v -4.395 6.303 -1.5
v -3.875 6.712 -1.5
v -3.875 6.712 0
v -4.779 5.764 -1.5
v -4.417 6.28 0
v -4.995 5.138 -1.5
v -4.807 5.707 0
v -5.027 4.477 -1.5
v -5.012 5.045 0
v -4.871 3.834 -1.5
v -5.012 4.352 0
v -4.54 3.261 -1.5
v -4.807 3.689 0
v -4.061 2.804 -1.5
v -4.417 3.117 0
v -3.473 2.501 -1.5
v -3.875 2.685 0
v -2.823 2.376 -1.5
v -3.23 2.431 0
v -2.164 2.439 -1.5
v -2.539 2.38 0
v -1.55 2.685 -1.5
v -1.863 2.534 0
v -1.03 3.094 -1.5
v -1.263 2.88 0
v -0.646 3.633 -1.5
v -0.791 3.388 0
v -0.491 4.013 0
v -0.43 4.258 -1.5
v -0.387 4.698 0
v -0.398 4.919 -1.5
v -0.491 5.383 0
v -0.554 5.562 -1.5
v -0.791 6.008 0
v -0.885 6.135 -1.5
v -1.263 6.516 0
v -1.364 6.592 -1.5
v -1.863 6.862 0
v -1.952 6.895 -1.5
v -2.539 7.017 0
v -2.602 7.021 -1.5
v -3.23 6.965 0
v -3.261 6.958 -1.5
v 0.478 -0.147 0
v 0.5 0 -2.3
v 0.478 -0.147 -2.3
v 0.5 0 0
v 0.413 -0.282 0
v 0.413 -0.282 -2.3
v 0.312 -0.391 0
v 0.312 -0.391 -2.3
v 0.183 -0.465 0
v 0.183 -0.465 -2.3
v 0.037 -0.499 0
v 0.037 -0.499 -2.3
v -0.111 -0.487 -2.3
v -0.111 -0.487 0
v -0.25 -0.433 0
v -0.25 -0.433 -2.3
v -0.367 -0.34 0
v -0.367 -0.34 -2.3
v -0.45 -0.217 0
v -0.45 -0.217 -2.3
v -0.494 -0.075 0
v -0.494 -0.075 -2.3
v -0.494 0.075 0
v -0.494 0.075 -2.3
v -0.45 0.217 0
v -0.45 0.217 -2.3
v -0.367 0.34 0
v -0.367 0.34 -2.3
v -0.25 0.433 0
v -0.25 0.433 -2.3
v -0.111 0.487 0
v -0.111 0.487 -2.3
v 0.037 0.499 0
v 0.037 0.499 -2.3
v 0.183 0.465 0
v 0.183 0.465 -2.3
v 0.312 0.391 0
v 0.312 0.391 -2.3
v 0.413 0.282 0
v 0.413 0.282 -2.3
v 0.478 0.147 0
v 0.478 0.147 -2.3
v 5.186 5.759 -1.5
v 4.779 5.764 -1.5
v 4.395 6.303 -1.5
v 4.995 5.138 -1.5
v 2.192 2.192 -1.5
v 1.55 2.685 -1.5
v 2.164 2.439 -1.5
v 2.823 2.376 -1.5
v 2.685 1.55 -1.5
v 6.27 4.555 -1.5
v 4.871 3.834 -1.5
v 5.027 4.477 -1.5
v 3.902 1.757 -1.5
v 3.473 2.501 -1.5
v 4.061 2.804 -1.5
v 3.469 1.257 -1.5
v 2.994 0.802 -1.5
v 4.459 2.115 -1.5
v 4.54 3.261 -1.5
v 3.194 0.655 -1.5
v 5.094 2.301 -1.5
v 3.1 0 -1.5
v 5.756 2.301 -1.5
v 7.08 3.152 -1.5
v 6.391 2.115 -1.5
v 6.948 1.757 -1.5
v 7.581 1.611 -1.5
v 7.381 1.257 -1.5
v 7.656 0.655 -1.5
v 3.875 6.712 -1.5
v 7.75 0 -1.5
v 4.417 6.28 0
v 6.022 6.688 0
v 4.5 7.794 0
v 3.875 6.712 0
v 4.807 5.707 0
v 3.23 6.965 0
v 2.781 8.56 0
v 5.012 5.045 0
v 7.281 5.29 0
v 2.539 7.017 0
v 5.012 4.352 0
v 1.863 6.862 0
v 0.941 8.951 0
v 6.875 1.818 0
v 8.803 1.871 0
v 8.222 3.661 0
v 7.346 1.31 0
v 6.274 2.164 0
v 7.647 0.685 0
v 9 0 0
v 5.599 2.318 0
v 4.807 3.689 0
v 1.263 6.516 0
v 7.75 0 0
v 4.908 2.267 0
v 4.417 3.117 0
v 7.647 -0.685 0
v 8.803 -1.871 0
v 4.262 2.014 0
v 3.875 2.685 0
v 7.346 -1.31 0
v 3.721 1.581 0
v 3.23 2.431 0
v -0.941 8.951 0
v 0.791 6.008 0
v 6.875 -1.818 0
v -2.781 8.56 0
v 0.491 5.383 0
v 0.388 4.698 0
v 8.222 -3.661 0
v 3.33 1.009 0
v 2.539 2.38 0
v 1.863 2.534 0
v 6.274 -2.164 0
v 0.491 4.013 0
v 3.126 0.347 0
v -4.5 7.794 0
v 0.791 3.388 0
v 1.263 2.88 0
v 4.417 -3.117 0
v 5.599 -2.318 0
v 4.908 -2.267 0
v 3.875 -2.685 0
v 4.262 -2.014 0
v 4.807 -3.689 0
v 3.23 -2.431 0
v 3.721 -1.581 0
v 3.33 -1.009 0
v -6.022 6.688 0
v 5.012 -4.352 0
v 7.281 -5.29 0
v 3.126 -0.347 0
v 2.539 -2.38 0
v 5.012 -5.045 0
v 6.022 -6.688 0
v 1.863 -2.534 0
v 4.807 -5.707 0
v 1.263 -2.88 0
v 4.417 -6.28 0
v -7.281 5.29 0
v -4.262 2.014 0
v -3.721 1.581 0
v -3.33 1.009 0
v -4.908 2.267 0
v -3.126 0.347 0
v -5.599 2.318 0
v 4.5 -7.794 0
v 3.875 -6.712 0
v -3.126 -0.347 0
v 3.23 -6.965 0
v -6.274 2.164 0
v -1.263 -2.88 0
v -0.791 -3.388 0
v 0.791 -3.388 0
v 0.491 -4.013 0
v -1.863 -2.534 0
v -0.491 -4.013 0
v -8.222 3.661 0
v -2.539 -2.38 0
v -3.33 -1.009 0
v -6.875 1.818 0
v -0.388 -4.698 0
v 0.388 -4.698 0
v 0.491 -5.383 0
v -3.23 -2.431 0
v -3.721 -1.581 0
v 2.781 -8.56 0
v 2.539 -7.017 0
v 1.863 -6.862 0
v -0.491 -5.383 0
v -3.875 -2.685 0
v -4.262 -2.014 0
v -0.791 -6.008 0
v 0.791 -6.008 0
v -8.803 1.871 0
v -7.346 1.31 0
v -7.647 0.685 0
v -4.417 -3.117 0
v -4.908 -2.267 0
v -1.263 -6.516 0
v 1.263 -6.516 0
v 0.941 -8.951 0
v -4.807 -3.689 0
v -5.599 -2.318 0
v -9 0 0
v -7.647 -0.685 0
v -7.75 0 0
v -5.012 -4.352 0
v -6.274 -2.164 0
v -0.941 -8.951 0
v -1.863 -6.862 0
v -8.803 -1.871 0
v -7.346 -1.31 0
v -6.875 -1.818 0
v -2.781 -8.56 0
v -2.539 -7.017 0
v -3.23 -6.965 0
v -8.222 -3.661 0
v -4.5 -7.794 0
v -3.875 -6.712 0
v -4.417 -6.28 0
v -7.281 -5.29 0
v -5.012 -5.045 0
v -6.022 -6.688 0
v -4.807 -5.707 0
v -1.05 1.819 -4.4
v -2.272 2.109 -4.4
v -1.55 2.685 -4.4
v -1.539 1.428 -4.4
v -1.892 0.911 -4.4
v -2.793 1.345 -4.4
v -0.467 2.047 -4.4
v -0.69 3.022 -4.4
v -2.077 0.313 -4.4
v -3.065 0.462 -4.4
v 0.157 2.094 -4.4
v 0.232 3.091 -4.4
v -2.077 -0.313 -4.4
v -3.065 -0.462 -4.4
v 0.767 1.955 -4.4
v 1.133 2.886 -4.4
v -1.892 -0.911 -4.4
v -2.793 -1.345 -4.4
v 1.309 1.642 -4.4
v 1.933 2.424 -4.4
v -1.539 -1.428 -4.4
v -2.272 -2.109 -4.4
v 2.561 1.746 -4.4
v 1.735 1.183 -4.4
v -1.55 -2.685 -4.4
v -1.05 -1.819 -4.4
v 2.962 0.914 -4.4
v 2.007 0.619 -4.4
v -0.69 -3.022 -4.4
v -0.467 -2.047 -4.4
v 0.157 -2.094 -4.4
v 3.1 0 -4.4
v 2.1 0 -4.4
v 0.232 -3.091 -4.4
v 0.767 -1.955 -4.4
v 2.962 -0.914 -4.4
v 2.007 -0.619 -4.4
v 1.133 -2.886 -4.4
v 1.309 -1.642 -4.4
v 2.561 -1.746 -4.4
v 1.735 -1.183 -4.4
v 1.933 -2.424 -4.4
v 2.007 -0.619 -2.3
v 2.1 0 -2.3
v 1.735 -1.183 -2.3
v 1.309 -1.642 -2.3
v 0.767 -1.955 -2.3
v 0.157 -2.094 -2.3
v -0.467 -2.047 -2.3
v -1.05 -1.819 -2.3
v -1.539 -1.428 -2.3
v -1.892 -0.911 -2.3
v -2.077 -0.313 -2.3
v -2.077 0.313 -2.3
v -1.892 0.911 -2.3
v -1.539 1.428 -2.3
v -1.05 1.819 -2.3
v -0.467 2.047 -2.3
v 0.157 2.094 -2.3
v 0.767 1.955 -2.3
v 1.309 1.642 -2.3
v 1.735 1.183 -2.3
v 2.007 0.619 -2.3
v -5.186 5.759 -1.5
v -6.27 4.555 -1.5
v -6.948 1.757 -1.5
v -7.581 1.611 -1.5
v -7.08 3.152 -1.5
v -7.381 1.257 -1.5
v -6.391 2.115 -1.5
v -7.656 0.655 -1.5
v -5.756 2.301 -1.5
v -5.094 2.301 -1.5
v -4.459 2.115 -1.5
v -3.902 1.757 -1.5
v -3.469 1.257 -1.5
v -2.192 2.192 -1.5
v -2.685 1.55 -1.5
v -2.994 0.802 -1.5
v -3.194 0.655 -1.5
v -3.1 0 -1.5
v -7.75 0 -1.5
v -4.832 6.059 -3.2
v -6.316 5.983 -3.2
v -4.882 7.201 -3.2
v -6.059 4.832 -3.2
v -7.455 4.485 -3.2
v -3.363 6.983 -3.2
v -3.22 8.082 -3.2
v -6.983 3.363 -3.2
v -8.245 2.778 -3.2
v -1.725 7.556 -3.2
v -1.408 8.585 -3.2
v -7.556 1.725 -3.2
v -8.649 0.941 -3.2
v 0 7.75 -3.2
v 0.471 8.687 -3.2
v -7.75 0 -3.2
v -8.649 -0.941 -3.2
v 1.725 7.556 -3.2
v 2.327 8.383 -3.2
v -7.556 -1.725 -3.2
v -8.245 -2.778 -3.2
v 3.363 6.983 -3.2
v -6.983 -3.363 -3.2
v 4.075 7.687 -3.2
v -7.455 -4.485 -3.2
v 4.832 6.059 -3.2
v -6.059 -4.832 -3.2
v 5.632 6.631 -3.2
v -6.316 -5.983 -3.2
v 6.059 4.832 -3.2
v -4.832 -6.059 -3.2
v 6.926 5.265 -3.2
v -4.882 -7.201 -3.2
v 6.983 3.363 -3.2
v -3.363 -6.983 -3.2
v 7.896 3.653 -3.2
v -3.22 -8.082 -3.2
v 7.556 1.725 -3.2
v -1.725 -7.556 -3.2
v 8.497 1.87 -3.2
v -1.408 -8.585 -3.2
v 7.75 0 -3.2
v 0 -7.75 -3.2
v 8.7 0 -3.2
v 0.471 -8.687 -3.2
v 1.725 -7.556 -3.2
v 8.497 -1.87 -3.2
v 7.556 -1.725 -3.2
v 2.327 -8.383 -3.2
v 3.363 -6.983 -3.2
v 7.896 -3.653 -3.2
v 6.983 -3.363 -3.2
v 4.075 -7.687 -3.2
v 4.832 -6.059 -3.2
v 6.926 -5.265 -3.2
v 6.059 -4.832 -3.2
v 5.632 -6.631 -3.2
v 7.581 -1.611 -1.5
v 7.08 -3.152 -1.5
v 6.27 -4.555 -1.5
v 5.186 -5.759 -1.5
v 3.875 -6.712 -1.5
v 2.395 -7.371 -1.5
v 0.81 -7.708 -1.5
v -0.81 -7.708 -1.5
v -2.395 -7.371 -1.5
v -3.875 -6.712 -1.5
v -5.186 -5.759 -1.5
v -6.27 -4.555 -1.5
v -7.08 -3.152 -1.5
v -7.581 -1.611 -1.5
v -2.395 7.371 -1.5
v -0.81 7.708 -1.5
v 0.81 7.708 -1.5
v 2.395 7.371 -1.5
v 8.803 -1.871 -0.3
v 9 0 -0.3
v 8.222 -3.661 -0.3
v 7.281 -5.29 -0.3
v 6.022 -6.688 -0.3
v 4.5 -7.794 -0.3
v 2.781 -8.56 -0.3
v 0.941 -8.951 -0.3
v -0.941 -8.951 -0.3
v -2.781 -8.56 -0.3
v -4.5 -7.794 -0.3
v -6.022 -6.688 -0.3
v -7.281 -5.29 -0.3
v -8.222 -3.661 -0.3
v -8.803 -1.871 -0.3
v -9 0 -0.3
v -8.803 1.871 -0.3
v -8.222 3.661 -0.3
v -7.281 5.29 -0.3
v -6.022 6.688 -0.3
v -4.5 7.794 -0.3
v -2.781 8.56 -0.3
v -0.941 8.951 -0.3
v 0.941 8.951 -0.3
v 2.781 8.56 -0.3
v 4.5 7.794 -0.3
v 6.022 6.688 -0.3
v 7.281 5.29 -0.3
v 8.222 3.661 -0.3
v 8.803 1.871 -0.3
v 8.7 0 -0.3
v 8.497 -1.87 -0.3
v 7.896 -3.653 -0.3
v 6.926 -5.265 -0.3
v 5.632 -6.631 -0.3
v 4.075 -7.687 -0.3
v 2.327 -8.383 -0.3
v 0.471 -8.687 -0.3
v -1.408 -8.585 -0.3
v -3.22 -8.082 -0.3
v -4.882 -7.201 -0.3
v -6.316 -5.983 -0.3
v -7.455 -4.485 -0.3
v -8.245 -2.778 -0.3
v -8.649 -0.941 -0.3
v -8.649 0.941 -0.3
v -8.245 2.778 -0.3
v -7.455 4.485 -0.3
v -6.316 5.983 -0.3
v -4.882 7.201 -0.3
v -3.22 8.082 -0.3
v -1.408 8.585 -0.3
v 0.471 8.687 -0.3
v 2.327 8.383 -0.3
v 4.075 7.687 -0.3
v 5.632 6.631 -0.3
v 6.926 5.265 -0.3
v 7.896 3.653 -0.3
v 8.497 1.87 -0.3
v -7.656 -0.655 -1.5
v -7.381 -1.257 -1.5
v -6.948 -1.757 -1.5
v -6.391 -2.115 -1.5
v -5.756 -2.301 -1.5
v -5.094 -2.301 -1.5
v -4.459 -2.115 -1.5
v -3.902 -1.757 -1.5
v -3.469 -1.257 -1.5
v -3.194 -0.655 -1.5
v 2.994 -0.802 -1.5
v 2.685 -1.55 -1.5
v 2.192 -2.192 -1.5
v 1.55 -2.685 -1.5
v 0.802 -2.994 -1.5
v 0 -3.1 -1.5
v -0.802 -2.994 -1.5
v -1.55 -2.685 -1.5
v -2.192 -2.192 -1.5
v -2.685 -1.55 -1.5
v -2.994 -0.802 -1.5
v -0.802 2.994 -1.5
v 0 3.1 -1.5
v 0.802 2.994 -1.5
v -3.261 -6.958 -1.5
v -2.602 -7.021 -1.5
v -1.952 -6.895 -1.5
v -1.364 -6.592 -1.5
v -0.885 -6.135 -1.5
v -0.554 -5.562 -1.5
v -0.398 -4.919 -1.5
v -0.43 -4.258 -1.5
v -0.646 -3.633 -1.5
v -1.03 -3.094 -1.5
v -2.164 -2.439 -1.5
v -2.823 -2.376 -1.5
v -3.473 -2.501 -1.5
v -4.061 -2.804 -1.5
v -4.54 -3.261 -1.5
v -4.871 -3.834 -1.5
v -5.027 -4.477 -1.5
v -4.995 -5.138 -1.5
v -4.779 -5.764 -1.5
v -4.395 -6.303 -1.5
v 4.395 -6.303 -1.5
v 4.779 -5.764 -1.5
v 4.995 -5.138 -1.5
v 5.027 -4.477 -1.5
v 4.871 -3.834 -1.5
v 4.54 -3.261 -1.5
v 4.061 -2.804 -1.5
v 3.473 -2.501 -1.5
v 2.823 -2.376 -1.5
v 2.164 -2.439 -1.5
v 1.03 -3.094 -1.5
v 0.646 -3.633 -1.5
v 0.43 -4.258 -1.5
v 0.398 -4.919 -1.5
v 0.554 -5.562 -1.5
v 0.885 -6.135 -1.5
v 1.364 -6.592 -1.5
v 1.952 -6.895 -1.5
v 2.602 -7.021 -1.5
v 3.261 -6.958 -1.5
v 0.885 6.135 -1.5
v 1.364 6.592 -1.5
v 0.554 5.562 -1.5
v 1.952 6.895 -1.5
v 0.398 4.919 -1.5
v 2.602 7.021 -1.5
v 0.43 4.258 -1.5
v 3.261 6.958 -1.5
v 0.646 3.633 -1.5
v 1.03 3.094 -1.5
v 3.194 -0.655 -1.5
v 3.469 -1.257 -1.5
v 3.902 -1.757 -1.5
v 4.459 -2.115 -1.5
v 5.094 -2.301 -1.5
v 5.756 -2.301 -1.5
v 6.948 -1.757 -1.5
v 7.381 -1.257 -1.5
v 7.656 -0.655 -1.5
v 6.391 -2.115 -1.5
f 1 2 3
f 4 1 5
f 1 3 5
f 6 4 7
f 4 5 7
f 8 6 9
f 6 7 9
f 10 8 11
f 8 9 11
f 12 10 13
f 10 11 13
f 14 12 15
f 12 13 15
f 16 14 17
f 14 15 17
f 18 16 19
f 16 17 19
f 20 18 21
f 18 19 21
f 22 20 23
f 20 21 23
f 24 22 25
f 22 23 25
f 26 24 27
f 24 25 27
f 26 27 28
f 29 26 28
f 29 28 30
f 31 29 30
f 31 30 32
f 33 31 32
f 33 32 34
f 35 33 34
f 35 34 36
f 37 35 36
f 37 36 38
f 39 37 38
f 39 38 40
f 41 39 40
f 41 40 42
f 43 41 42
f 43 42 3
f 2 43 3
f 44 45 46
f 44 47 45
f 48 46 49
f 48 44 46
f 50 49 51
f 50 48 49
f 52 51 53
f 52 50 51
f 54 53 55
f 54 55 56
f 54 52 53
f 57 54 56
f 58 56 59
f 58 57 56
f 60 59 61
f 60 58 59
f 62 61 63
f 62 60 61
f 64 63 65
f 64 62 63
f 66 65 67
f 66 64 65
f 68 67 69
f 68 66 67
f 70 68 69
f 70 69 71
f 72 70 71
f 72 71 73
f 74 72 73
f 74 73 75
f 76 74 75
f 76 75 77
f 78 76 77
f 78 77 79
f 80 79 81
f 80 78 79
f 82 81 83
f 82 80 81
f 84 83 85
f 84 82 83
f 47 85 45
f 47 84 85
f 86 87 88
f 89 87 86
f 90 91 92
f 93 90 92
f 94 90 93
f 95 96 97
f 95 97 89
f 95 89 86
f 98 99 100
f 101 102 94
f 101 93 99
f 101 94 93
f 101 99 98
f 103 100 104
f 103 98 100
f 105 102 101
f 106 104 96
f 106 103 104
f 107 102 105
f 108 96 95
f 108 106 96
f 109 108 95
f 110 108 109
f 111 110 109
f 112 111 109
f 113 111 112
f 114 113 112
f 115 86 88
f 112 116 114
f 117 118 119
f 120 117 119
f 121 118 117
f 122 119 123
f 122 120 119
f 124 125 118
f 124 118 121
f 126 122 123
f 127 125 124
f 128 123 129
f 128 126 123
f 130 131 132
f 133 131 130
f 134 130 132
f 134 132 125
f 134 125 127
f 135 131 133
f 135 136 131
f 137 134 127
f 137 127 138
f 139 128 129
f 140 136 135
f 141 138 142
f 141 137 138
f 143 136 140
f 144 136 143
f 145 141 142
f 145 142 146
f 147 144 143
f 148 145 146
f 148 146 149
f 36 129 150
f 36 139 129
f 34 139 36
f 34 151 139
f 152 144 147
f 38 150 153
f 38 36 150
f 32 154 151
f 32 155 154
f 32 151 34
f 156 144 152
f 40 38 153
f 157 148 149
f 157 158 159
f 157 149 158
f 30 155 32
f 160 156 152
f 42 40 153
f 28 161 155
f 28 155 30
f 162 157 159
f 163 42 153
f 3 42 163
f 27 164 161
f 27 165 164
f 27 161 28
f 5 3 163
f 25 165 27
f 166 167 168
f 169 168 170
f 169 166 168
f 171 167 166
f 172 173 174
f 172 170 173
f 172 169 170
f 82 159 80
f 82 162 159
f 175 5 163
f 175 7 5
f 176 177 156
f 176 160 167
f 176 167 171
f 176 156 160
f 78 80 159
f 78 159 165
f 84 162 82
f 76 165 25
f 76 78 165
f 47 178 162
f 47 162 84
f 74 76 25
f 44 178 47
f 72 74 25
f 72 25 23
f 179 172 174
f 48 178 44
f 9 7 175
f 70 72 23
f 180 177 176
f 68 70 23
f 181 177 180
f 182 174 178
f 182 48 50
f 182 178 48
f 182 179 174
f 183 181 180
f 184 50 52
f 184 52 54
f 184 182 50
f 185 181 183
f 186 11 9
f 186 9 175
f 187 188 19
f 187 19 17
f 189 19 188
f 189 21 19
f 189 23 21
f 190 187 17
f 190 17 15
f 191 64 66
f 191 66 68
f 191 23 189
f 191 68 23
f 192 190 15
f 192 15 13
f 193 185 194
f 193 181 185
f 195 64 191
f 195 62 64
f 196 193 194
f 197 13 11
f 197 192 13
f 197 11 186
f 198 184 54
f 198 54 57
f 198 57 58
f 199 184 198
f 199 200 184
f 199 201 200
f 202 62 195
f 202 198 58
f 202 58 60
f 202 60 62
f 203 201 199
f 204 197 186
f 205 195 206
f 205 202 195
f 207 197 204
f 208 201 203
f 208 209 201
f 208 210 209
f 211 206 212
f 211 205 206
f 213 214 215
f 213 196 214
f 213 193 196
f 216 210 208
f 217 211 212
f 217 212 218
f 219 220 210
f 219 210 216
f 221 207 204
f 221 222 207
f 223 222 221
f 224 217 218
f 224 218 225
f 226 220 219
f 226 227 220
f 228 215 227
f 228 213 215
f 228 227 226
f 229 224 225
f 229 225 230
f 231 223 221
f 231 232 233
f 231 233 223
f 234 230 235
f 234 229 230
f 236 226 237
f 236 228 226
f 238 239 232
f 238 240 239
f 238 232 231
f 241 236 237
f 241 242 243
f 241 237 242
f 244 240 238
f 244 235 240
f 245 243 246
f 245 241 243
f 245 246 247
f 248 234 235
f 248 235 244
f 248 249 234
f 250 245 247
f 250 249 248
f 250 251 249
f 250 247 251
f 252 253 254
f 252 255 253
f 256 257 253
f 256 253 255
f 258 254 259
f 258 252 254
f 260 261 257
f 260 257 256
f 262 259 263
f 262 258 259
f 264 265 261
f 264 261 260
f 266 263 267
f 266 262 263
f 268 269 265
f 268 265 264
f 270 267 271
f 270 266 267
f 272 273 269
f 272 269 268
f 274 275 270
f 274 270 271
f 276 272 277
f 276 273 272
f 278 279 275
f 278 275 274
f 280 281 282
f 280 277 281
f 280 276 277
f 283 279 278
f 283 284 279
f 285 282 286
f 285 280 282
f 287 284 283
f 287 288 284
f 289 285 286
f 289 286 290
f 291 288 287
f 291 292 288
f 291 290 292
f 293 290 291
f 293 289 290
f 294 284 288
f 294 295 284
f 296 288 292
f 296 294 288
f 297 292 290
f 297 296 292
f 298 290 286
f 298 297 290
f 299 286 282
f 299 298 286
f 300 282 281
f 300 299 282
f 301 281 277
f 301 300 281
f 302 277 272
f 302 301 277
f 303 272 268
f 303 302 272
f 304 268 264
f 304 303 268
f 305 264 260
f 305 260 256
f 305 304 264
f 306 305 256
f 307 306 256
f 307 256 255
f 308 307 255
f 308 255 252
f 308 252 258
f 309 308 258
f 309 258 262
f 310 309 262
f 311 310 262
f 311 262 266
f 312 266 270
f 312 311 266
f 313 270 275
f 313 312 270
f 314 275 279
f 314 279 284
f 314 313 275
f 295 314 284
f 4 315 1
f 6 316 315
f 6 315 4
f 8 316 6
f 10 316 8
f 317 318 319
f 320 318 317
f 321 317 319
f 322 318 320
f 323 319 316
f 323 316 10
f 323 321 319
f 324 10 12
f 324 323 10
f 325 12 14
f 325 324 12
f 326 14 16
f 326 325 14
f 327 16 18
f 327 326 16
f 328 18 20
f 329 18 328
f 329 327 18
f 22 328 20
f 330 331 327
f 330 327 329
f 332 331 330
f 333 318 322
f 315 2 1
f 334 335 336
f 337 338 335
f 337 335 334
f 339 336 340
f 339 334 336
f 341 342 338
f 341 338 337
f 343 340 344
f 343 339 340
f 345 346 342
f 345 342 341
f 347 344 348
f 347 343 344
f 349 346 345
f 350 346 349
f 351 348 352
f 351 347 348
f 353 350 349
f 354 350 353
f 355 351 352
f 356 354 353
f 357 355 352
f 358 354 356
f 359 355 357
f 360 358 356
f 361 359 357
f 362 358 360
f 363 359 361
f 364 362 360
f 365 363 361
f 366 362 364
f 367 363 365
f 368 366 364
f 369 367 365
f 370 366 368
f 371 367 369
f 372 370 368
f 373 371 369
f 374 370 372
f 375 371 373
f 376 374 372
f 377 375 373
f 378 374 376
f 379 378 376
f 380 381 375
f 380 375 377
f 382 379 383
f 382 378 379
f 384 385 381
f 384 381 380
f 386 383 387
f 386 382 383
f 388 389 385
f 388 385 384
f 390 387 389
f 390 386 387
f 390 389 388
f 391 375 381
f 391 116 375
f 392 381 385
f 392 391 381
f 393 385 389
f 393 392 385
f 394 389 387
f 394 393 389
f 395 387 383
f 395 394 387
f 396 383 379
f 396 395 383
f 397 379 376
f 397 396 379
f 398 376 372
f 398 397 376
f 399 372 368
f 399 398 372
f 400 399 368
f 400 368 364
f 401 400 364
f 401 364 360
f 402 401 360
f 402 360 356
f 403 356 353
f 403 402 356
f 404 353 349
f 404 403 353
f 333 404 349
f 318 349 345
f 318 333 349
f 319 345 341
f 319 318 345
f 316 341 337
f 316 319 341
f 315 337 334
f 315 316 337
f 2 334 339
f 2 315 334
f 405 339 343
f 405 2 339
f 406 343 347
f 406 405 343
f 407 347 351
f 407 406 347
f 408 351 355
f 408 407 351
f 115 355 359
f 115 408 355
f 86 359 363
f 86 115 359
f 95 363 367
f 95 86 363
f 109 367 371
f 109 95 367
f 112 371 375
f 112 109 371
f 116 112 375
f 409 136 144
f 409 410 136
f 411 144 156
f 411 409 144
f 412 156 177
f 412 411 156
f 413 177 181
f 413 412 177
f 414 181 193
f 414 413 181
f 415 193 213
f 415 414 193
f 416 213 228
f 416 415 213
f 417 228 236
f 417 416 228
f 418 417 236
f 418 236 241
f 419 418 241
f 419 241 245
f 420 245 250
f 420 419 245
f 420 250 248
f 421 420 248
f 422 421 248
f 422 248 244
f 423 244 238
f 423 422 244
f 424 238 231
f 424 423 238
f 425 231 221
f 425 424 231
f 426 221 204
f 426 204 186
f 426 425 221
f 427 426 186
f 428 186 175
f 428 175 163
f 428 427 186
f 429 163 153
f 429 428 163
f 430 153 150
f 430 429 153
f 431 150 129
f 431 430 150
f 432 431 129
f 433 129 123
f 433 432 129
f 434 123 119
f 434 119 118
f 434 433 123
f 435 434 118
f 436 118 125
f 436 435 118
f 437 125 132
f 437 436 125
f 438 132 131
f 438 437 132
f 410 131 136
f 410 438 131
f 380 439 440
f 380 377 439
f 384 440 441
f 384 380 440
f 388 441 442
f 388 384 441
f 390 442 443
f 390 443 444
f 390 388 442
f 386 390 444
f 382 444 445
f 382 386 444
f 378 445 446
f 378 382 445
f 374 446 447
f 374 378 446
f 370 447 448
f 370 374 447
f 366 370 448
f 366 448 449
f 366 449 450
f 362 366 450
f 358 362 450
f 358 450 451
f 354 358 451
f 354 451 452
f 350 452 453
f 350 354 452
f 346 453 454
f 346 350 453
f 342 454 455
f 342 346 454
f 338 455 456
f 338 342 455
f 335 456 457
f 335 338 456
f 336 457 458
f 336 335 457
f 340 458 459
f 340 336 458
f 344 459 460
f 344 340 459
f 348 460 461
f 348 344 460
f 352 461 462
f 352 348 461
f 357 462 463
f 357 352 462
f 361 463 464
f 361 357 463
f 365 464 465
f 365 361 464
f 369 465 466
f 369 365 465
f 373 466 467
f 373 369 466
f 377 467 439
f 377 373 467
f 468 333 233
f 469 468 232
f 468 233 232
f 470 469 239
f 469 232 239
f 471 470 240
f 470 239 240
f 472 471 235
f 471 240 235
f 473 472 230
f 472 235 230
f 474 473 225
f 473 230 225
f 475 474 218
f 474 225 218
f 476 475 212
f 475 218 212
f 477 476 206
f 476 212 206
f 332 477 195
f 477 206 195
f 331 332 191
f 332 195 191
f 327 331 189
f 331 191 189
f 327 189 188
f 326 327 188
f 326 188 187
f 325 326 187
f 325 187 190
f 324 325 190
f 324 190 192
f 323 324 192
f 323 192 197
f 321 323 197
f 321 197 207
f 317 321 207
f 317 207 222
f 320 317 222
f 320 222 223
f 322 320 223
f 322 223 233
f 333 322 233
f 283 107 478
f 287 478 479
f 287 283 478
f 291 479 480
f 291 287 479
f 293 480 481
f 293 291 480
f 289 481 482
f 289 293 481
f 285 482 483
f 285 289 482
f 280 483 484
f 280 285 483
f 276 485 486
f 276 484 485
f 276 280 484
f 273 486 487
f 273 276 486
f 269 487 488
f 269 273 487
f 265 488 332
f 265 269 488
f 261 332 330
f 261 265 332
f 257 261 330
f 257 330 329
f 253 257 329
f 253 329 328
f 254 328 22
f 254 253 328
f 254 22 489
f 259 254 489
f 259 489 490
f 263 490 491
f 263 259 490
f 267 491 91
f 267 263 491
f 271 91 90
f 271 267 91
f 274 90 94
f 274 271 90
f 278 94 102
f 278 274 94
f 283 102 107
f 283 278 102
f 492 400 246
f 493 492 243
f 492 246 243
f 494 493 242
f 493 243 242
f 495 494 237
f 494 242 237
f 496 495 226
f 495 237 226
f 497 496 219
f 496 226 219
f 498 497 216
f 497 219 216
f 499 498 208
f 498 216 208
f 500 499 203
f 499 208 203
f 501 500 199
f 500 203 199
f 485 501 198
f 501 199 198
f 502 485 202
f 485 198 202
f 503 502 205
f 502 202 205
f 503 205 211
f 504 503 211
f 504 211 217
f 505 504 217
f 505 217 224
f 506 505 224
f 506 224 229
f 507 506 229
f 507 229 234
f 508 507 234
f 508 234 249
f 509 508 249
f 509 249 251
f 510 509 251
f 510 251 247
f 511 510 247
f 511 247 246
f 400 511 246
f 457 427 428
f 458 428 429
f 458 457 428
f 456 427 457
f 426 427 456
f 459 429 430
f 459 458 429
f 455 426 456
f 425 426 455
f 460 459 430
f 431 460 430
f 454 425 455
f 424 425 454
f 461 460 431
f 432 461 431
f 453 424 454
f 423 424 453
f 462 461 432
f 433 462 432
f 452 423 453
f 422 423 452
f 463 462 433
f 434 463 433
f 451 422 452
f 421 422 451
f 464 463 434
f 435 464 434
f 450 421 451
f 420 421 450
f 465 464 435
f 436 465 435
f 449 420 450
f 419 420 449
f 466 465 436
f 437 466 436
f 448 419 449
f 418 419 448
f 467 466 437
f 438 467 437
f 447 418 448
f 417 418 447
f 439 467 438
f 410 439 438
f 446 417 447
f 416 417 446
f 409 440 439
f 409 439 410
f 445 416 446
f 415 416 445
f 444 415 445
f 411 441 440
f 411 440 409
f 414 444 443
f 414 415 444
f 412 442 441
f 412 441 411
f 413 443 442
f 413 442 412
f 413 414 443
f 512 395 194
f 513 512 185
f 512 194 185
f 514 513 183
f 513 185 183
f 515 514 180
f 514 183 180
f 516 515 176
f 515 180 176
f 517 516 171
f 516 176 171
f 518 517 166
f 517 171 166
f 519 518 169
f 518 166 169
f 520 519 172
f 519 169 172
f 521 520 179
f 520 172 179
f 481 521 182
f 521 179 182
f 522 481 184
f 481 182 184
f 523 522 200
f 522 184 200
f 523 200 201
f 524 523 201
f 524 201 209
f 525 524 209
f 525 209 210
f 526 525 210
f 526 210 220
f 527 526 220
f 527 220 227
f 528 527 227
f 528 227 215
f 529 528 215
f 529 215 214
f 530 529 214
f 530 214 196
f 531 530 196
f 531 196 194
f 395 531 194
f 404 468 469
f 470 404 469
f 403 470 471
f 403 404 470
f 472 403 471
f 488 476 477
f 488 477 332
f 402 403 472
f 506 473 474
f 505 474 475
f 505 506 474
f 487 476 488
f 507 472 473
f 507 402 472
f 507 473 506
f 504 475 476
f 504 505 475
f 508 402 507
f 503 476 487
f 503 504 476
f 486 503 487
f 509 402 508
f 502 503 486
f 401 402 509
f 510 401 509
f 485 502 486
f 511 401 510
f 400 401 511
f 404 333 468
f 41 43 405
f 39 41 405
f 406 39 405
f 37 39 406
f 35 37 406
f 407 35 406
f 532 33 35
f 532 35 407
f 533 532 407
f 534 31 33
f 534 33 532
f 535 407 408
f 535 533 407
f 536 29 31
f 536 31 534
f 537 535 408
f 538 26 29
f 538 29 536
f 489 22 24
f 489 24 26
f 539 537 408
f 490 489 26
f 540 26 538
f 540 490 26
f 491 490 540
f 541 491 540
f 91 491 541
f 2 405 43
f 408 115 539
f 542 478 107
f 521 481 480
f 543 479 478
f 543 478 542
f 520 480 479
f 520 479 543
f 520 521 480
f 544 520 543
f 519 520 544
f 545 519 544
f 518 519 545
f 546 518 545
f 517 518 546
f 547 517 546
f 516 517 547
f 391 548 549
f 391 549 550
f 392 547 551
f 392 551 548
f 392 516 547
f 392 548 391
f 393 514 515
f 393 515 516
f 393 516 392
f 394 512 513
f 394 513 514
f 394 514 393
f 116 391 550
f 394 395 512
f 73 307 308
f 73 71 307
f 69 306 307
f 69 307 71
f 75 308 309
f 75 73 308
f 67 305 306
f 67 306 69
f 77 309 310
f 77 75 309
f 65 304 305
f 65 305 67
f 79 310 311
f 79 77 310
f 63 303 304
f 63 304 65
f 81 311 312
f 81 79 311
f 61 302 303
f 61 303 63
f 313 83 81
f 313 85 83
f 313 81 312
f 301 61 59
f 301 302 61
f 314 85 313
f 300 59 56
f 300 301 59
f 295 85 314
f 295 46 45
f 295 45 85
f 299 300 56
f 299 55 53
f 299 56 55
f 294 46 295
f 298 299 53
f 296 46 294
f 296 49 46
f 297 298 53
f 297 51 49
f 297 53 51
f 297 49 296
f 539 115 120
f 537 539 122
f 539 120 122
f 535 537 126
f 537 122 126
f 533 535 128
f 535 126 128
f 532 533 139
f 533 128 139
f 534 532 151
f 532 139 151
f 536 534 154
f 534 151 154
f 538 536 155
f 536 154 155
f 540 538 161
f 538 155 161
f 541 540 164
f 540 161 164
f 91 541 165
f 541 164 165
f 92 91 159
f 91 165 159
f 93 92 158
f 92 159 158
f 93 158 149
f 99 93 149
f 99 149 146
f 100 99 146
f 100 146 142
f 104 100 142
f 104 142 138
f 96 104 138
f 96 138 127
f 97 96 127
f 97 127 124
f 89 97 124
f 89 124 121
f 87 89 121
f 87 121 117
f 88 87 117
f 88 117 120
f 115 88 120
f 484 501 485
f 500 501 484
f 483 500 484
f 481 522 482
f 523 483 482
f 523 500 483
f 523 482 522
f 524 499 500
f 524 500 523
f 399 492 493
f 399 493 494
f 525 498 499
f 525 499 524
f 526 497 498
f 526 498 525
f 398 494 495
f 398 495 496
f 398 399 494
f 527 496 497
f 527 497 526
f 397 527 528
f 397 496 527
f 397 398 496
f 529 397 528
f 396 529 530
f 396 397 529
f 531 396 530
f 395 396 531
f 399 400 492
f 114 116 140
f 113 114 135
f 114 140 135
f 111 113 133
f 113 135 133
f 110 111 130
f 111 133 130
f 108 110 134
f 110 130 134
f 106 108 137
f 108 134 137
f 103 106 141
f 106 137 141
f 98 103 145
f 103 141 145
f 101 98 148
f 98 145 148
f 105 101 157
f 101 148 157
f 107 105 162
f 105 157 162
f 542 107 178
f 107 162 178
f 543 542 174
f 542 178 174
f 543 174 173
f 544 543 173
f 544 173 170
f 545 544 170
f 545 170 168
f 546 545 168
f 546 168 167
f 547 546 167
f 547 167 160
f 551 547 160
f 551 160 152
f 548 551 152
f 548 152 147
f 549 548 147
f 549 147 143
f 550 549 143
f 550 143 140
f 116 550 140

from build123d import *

# Parameters (mm, degrees)
CUT_EXTRUDE1_REACH = 15.467
SKETCH2_R          = 2.325
CIRPATTERN1_COUNT  = 6


with BuildPart() as part:
    # Sketch1 → Revolve1 (revolve)
    with BuildSketch(Plane(origin=(0, 0, 0), x_dir=(0, 0, -1), z_dir=(1, 0, 0)), mode=Mode.PRIVATE) as revolve1_sk:
        Polygon((1.5, 3.1), (4.4, 3.1), (4.4, 2.1), (2.3, 2.1), (2.3, 0.5), (0, 0.5), (0, 9), (0.3, 9), (0.3, 8.7), (3.2, 8.7), (3.2, 7.75), (1.5, 7.75), align=None)
    revolve(revolve1_sk.sketch.rotate(Axis((0, 0, 59.838000458), (0, 0, -1)), 90), axis=Axis((0, 0, 59.838000458), (0, 0, -1)))

    # Sketch2 → Cut-Extrude1 (cut, up to next)
    with BuildSketch(Plane.XY, mode=Mode.PRIVATE) as cut_extrude1_sk1:
        with Locations((5.425, 0)):
            Circle(SKETCH2_R)
    cut_extrude1_tool1 = extrude(cut_extrude1_sk1.sketch, amount=-CUT_EXTRUDE1_REACH, mode=Mode.PRIVATE) & part.part
    cut_extrude1 = cut_extrude1_tool1.solids().sort_by_distance((5.425, 0, 0))[0]
    add(cut_extrude1, mode=Mode.SUBTRACT)

    # CirPattern1: Cut-Extrude1 ×6 about axis
    cirpattern1_axis = Axis((0, 0, 0), (0, 0, 1))
    for i in range(1, CIRPATTERN1_COUNT):
        add(cut_extrude1.rotate(cirpattern1_axis, i * 360 / CIRPATTERN1_COUNT), mode=Mode.SUBTRACT)


solid = part.part
